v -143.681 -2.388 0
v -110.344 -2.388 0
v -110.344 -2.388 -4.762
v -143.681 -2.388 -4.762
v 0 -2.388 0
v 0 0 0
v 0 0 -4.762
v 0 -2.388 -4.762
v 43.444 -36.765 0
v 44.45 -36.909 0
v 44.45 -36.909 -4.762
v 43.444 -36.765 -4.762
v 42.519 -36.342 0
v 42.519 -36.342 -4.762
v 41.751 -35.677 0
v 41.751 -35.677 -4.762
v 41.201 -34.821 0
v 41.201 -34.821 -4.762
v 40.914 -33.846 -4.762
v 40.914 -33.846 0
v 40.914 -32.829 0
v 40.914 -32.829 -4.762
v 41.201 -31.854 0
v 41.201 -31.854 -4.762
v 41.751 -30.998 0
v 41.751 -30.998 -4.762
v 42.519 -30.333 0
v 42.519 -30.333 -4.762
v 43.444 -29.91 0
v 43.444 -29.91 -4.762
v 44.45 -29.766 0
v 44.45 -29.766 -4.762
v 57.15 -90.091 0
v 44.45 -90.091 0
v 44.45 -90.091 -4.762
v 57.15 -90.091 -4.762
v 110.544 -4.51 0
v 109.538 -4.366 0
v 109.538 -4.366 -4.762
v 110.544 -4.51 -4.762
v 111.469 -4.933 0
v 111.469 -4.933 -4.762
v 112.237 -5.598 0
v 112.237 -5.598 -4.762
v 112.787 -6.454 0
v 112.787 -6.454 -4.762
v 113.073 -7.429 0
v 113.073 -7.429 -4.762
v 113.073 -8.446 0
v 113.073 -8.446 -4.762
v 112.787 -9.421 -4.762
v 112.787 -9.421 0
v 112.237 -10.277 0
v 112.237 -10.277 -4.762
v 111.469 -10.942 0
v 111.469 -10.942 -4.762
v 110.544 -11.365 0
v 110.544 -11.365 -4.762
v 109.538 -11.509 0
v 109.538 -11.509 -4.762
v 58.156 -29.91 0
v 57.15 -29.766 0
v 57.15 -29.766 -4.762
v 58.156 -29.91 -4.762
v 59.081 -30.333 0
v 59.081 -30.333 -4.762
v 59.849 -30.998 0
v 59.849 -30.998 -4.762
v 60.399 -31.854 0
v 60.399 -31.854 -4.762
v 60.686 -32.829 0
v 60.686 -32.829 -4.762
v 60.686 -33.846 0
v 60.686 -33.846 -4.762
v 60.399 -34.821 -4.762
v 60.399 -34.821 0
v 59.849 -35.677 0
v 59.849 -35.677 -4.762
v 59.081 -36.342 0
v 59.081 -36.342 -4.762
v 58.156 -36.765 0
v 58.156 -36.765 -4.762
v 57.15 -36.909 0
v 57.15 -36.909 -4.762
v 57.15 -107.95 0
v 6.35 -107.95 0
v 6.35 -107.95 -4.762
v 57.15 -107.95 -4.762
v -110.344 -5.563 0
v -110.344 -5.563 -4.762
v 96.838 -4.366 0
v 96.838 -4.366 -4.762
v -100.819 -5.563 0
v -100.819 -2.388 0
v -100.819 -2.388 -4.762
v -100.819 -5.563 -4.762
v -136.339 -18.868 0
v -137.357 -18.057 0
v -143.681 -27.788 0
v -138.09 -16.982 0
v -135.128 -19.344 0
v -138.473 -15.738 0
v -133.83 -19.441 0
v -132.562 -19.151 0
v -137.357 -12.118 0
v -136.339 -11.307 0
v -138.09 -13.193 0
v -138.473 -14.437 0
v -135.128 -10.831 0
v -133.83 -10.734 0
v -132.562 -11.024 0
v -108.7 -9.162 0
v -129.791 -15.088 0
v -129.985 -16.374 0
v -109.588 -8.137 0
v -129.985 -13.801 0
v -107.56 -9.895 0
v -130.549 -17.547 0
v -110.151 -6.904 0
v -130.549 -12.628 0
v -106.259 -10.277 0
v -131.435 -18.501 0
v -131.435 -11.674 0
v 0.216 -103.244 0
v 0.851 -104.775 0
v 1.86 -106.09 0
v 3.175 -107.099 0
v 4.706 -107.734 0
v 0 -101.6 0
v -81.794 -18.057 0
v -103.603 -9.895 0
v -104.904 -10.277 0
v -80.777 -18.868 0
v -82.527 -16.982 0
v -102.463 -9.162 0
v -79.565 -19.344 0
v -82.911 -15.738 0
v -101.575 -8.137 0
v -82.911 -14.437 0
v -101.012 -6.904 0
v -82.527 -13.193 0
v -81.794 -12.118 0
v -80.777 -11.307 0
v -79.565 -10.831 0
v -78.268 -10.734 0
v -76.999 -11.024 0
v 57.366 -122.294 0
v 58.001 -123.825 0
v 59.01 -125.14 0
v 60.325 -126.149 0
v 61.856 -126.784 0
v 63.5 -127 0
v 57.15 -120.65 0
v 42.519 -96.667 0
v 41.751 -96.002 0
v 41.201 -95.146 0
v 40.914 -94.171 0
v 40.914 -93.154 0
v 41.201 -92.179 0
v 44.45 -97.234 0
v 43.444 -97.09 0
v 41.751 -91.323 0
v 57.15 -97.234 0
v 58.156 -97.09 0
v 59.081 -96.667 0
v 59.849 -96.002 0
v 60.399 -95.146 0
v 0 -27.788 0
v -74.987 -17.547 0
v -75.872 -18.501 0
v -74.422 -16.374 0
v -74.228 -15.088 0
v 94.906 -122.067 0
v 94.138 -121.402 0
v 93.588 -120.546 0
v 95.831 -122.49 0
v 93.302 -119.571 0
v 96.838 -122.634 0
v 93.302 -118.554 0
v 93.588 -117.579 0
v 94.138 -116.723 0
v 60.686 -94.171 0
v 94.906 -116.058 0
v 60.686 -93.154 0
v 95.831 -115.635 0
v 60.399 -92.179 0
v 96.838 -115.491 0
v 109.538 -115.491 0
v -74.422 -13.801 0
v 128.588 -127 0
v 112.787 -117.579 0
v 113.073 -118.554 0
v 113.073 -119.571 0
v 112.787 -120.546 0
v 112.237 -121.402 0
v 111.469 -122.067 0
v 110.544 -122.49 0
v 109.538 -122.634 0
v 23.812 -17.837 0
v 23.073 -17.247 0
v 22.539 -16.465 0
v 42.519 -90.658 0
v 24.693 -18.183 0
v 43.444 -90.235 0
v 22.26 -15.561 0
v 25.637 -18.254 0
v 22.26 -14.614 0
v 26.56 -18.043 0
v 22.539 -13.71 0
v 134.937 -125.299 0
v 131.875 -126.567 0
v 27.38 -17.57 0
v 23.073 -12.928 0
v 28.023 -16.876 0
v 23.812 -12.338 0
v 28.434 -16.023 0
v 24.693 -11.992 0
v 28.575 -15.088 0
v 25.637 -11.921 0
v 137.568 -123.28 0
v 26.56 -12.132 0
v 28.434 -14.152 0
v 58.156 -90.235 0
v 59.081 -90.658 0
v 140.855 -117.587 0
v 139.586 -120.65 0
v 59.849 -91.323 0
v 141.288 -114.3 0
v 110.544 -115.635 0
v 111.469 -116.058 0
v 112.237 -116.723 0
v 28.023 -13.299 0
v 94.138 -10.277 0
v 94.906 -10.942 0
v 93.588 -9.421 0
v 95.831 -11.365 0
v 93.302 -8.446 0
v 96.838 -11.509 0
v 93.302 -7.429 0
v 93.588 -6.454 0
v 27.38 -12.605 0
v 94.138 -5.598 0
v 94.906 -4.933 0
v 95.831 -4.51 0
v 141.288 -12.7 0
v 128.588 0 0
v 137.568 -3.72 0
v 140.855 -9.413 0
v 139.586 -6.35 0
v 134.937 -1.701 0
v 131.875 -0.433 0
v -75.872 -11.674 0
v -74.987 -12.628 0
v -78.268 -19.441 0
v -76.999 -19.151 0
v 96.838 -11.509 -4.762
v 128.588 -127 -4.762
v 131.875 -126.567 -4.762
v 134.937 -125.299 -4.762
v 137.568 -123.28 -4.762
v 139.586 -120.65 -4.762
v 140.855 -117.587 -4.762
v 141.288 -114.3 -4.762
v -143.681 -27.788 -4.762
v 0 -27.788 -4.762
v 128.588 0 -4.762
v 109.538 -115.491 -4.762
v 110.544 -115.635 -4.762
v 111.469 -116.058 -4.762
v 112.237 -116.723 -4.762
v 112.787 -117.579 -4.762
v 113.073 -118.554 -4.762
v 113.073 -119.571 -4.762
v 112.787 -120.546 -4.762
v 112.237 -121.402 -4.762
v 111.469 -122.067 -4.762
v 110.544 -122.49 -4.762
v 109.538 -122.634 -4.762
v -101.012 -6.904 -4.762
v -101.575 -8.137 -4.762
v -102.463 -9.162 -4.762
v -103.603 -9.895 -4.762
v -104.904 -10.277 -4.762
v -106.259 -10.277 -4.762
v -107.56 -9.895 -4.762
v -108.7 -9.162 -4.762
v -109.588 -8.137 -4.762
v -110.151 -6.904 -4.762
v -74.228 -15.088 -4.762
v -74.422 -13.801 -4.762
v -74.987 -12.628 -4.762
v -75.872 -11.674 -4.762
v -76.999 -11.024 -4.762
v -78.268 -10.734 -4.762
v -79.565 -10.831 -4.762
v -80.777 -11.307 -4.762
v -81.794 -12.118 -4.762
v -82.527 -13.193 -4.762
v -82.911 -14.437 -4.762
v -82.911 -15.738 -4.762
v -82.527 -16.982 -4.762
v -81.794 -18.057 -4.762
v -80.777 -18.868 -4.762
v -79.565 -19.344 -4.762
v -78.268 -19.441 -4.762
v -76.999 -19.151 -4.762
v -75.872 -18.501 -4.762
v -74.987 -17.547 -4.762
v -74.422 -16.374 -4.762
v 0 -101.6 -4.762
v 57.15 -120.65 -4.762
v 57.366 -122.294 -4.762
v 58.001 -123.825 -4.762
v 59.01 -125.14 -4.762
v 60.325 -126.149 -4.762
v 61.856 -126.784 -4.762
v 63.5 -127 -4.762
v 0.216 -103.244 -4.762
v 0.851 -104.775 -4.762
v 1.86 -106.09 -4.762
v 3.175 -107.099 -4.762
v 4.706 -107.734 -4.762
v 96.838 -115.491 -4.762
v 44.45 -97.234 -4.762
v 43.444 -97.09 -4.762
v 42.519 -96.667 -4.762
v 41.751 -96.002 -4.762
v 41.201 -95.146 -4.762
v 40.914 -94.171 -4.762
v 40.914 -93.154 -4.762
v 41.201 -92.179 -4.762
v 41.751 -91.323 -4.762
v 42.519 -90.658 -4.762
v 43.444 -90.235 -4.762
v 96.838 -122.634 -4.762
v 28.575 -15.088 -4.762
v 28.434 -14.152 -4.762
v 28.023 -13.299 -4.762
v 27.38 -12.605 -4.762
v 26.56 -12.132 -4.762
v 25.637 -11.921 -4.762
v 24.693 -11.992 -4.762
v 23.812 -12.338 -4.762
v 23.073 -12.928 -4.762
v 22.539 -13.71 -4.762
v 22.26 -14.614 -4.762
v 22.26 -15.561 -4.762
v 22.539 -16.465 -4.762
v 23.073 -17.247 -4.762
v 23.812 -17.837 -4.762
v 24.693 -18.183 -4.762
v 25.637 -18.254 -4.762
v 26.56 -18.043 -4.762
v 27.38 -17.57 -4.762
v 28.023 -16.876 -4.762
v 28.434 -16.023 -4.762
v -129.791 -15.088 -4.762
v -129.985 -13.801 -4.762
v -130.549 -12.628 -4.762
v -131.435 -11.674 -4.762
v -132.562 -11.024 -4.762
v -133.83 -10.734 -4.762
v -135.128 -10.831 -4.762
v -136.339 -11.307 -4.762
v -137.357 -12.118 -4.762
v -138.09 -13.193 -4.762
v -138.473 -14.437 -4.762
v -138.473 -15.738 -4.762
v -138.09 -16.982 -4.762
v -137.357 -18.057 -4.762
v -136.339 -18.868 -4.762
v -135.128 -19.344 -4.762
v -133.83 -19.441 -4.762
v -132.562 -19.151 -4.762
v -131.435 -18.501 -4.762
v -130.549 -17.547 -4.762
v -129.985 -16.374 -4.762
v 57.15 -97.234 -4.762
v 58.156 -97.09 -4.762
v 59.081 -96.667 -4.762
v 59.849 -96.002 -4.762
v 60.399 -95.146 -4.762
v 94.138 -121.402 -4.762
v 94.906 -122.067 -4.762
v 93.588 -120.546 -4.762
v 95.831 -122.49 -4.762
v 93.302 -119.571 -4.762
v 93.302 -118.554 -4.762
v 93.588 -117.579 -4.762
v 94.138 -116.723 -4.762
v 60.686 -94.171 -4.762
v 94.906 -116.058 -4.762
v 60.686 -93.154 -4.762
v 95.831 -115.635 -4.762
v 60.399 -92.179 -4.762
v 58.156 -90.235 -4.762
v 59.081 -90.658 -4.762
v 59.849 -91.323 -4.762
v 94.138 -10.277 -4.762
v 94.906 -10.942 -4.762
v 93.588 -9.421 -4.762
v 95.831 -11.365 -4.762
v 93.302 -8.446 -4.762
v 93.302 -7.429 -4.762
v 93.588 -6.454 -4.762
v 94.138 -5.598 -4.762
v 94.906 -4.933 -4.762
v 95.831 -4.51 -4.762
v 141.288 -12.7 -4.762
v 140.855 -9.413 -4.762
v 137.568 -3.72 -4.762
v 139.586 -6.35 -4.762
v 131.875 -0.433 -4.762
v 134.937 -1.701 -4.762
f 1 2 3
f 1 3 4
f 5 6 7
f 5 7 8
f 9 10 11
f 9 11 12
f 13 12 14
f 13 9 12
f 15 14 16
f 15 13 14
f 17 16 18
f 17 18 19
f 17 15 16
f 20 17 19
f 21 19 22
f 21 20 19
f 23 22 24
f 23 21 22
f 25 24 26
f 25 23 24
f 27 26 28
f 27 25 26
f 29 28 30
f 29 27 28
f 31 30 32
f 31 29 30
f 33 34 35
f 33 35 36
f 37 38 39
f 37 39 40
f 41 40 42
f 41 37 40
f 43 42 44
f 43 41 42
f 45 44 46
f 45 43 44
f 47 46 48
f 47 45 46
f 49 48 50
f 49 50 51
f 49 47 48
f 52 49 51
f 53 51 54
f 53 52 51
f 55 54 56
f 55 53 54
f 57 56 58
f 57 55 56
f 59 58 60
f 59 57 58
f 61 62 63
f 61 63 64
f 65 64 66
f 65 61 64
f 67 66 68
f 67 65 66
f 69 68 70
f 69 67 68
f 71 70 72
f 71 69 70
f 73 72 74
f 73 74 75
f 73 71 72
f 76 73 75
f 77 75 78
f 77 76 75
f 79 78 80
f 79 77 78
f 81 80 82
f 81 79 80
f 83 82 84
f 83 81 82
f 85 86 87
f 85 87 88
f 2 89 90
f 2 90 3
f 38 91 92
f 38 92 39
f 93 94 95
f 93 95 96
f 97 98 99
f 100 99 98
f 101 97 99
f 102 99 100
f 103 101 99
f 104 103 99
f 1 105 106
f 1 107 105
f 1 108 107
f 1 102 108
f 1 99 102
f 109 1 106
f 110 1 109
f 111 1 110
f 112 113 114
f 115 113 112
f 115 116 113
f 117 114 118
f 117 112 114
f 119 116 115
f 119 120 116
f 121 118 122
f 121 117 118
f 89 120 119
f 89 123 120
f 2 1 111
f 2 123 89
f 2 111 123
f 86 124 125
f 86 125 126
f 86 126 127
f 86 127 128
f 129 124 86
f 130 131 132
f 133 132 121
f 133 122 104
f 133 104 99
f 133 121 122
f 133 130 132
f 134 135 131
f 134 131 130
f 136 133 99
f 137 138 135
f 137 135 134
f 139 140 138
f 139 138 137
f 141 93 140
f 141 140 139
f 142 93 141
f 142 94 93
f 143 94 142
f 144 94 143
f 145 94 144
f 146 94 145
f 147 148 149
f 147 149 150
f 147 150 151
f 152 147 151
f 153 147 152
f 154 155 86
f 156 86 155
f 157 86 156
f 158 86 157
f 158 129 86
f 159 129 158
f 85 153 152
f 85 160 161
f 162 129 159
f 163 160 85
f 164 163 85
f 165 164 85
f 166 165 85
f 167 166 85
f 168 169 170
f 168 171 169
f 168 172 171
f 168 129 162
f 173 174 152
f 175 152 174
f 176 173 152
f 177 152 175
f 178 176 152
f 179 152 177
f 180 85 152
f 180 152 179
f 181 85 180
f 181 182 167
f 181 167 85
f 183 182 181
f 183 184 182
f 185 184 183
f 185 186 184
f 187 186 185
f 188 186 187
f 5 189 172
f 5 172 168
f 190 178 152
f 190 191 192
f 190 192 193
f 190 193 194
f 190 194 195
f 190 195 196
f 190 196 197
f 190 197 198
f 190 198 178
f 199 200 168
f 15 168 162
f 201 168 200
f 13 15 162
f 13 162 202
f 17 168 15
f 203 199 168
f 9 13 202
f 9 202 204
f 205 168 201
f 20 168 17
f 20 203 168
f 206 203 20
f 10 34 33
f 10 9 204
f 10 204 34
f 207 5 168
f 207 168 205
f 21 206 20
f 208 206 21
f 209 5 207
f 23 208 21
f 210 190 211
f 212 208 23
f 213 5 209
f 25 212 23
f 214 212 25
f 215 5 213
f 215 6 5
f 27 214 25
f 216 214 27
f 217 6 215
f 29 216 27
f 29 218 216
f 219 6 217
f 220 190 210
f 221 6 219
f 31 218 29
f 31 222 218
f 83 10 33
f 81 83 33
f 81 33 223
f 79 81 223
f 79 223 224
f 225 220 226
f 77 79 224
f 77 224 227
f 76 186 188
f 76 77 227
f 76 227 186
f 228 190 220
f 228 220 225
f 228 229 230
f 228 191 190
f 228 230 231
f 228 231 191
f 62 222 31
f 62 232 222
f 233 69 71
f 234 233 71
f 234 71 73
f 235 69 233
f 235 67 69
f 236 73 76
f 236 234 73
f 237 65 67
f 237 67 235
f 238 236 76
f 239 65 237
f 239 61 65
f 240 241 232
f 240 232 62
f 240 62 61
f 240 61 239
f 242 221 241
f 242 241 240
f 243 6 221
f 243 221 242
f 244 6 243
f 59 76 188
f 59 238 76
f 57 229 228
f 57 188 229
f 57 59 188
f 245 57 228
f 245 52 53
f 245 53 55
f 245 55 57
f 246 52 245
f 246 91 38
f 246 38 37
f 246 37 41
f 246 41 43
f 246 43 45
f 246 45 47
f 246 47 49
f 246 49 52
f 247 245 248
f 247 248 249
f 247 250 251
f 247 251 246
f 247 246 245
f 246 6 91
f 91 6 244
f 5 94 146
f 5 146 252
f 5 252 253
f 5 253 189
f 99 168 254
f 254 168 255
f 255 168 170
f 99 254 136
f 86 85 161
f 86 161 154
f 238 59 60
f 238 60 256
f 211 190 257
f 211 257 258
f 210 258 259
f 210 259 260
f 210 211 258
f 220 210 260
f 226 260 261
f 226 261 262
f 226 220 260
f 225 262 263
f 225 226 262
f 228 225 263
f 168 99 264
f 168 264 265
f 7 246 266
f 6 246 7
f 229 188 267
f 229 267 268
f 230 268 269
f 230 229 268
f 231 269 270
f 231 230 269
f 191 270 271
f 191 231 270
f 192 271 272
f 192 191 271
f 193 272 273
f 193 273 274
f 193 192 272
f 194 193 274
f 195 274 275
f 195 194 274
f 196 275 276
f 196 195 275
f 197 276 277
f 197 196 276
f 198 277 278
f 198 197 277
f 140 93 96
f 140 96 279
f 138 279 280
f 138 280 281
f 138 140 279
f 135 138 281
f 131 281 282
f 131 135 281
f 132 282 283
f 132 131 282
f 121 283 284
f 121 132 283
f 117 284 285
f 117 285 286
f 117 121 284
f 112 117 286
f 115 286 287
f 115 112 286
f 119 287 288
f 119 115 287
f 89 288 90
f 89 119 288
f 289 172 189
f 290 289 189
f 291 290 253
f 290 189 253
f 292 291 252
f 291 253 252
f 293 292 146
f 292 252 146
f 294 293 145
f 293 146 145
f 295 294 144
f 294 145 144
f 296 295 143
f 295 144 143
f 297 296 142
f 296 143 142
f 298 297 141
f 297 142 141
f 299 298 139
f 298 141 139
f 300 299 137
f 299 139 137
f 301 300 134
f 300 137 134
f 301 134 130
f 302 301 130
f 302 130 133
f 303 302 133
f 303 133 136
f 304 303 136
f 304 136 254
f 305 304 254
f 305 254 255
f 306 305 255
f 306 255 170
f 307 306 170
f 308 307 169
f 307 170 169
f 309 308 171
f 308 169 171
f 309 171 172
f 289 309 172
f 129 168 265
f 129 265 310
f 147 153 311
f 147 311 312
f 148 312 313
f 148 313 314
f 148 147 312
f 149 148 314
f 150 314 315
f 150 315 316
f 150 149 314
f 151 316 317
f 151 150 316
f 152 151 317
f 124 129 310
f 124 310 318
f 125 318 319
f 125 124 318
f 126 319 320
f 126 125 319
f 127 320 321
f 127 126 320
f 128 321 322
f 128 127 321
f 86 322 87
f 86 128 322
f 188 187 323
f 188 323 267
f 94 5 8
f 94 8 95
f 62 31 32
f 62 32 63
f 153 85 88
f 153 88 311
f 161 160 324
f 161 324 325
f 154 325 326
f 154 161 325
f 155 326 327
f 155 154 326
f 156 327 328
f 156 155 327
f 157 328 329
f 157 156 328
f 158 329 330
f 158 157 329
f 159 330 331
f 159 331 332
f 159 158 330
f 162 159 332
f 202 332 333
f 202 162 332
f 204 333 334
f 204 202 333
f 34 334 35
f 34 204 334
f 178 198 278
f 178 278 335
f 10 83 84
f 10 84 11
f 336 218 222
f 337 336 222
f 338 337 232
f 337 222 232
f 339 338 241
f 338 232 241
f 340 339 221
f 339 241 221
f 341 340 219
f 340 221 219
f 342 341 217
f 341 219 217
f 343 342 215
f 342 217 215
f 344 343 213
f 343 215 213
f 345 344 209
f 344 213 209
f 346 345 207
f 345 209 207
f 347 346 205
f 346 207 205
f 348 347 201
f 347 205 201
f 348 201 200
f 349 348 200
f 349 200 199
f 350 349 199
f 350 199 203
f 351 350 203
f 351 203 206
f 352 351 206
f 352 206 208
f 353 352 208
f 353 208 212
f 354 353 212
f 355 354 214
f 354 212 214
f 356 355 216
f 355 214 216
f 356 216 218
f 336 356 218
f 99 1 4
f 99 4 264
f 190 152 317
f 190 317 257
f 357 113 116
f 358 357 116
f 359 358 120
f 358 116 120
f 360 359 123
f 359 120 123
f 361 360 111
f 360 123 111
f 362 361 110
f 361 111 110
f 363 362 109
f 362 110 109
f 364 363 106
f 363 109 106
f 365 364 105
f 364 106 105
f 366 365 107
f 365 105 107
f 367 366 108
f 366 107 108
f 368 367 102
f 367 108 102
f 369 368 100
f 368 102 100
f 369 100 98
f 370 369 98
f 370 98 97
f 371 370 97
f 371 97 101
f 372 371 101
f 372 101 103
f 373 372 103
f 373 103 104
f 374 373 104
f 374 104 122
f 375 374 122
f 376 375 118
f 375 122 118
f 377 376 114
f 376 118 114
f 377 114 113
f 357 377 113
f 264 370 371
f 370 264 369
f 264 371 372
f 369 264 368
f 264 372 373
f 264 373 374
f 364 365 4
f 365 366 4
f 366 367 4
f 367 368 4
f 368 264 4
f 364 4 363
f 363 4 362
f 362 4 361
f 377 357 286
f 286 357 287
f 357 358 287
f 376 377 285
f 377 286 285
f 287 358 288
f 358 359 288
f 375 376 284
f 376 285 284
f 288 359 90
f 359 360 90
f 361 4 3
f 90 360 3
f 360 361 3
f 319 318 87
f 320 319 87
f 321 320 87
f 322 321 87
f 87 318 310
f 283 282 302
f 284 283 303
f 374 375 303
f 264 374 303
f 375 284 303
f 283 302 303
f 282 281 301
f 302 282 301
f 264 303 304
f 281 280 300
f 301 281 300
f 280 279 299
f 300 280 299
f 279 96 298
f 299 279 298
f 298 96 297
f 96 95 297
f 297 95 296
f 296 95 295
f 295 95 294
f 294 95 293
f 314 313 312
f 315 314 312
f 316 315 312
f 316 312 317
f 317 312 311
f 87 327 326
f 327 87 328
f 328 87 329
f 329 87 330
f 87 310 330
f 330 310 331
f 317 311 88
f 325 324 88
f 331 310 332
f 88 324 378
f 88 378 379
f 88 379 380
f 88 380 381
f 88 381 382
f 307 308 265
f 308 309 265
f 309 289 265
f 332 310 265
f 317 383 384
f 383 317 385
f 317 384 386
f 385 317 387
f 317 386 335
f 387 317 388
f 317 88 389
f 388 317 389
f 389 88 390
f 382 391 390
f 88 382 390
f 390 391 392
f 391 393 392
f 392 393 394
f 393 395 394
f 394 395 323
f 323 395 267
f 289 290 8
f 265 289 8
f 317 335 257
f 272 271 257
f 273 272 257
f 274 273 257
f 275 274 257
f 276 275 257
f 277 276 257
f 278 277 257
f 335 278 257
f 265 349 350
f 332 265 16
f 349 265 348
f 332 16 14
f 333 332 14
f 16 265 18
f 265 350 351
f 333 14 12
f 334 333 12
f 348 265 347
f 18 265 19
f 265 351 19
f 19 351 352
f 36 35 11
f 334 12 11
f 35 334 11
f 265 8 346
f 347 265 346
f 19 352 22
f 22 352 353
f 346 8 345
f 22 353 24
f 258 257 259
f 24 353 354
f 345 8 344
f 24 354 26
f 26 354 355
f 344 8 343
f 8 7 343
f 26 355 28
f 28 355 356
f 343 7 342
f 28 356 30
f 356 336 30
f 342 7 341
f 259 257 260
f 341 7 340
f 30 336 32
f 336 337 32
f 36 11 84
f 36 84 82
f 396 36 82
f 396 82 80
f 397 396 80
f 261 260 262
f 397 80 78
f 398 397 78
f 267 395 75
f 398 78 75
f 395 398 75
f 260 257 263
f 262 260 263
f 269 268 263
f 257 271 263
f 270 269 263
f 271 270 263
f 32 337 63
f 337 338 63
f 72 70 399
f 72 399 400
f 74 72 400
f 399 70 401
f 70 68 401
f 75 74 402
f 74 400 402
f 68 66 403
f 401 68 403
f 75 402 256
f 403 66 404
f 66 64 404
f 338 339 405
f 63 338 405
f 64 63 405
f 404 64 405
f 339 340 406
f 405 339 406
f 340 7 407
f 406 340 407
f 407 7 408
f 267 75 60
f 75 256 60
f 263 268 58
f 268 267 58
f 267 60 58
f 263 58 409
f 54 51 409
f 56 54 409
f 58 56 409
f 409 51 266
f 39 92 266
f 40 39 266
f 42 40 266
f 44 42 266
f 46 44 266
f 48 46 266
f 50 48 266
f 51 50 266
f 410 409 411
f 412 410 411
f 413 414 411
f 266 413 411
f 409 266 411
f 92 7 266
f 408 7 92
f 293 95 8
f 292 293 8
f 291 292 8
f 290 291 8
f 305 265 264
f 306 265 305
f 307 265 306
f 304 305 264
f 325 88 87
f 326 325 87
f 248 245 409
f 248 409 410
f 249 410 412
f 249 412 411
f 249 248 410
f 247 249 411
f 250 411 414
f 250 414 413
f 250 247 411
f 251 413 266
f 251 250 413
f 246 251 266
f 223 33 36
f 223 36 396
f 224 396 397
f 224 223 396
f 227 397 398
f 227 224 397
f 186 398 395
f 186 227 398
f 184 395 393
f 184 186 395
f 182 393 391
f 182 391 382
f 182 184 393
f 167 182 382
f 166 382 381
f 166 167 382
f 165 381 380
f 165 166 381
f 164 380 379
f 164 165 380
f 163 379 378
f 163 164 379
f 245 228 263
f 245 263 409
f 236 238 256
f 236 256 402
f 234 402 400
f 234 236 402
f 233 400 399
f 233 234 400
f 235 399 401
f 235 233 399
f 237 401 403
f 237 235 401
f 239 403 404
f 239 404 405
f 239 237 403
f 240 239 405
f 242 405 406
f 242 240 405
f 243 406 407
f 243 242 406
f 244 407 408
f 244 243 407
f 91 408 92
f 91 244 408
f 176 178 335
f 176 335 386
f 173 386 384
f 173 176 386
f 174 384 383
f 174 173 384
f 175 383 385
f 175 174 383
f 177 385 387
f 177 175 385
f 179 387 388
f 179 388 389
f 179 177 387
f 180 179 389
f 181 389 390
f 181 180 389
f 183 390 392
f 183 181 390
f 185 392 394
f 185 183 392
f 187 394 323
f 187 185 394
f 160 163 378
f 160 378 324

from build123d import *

# Parameters (mm, degrees)
F0_R     = 4.365625
F0_R_2   = 3.175
F1_DEPTH = 4.7625


with BuildPart() as f1:
    # F0 (on Top) → F1 (new body)
    with BuildSketch(Plane.XY):
        with BuildLine():
            Line((128.5875, 0), (0, 0))
            Line((0, 0), (0, -2.3876))
            Line((0, -2.3876), (-100.81895, -2.3876))
            Line((-100.81895, -2.3876), (-100.81895, -5.5626))
            ThreePointArc((-100.81895, -5.5626), (-105.58145, -10.3251), (-110.34395, -5.5626))
            Line((-110.34395, -5.5626), (-110.34395, -2.3876))
            Line((-110.34395, -2.3876), (-143.68145, -2.3876))
            Line((-143.68145, -2.3876), (-143.68145, -27.7876))
            Line((-143.68145, -27.7876), (0, -27.7876))
            Line((0, -27.7876), (0, -101.6))
            ThreePointArc((0, -101.6), (1.859872, -106.090128), (6.35, -107.95))
            Line((6.35, -107.95), (57.15, -107.95))
            Line((57.15, -107.95), (57.15, -120.65))
            ThreePointArc((57.15, -120.65), (59.009872, -125.140128), (63.5, -127))
            Line((63.5, -127), (128.5875, -127))
            ThreePointArc((128.5875, -127), (137.567756, -123.280256), (141.2875, -114.3))
            Line((141.2875, -114.3), (141.2875, -12.7))
            ThreePointArc((141.2875, -12.7), (137.567756, -3.719744), (128.5875, 0))
        make_face()
        with BuildLine():
            ThreePointArc((109.5375, -115.490625), (113.109375, -119.0625), (109.5375, -122.634375))
            Line((109.5375, -122.634375), (96.8375, -122.634375))
            ThreePointArc((96.8375, -122.634375), (93.265625, -119.0625), (96.8375, -115.490625))
            Line((96.8375, -115.490625), (109.5375, -115.490625))
        make_face(mode=Mode.SUBTRACT)
        with BuildLine():
            ThreePointArc((57.15, -90.090625), (60.721875, -93.6625), (57.15, -97.234375))
            Line((57.15, -97.234375), (44.45, -97.234375))
            ThreePointArc((44.45, -97.234375), (40.878125, -93.6625), (44.45, -90.090625))
            Line((44.45, -90.090625), (57.15, -90.090625))
        make_face(mode=Mode.SUBTRACT)
        with Locations((-134.15645, -15.0876)):
            Circle(F0_R, mode=Mode.SUBTRACT)
        with Locations((-78.59395, -15.0876)):
            Circle(F0_R, mode=Mode.SUBTRACT)
        with BuildLine():
            ThreePointArc((57.15, -29.765625), (60.721875, -33.3375), (57.15, -36.909375))
            Line((57.15, -36.909375), (44.45, -36.909375))
            ThreePointArc((44.45, -36.909375), (40.878125, -33.3375), (44.45, -29.765625))
            Line((44.45, -29.765625), (57.15, -29.765625))
        make_face(mode=Mode.SUBTRACT)
        with Locations((25.4, -15.0876)):
            Circle(F0_R_2, mode=Mode.SUBTRACT)
        with BuildLine():
            ThreePointArc((109.5375, -4.365625), (113.109375, -7.9375), (109.5375, -11.509375))
            Line((109.5375, -11.509375), (96.8375, -11.509375))
            ThreePointArc((96.8375, -11.509375), (93.265625, -7.9375), (96.8375, -4.365625))
            Line((96.8375, -4.365625), (109.5375, -4.365625))
        make_face(mode=Mode.SUBTRACT)
    extrude(amount=-F1_DEPTH)


solid = f1.part
